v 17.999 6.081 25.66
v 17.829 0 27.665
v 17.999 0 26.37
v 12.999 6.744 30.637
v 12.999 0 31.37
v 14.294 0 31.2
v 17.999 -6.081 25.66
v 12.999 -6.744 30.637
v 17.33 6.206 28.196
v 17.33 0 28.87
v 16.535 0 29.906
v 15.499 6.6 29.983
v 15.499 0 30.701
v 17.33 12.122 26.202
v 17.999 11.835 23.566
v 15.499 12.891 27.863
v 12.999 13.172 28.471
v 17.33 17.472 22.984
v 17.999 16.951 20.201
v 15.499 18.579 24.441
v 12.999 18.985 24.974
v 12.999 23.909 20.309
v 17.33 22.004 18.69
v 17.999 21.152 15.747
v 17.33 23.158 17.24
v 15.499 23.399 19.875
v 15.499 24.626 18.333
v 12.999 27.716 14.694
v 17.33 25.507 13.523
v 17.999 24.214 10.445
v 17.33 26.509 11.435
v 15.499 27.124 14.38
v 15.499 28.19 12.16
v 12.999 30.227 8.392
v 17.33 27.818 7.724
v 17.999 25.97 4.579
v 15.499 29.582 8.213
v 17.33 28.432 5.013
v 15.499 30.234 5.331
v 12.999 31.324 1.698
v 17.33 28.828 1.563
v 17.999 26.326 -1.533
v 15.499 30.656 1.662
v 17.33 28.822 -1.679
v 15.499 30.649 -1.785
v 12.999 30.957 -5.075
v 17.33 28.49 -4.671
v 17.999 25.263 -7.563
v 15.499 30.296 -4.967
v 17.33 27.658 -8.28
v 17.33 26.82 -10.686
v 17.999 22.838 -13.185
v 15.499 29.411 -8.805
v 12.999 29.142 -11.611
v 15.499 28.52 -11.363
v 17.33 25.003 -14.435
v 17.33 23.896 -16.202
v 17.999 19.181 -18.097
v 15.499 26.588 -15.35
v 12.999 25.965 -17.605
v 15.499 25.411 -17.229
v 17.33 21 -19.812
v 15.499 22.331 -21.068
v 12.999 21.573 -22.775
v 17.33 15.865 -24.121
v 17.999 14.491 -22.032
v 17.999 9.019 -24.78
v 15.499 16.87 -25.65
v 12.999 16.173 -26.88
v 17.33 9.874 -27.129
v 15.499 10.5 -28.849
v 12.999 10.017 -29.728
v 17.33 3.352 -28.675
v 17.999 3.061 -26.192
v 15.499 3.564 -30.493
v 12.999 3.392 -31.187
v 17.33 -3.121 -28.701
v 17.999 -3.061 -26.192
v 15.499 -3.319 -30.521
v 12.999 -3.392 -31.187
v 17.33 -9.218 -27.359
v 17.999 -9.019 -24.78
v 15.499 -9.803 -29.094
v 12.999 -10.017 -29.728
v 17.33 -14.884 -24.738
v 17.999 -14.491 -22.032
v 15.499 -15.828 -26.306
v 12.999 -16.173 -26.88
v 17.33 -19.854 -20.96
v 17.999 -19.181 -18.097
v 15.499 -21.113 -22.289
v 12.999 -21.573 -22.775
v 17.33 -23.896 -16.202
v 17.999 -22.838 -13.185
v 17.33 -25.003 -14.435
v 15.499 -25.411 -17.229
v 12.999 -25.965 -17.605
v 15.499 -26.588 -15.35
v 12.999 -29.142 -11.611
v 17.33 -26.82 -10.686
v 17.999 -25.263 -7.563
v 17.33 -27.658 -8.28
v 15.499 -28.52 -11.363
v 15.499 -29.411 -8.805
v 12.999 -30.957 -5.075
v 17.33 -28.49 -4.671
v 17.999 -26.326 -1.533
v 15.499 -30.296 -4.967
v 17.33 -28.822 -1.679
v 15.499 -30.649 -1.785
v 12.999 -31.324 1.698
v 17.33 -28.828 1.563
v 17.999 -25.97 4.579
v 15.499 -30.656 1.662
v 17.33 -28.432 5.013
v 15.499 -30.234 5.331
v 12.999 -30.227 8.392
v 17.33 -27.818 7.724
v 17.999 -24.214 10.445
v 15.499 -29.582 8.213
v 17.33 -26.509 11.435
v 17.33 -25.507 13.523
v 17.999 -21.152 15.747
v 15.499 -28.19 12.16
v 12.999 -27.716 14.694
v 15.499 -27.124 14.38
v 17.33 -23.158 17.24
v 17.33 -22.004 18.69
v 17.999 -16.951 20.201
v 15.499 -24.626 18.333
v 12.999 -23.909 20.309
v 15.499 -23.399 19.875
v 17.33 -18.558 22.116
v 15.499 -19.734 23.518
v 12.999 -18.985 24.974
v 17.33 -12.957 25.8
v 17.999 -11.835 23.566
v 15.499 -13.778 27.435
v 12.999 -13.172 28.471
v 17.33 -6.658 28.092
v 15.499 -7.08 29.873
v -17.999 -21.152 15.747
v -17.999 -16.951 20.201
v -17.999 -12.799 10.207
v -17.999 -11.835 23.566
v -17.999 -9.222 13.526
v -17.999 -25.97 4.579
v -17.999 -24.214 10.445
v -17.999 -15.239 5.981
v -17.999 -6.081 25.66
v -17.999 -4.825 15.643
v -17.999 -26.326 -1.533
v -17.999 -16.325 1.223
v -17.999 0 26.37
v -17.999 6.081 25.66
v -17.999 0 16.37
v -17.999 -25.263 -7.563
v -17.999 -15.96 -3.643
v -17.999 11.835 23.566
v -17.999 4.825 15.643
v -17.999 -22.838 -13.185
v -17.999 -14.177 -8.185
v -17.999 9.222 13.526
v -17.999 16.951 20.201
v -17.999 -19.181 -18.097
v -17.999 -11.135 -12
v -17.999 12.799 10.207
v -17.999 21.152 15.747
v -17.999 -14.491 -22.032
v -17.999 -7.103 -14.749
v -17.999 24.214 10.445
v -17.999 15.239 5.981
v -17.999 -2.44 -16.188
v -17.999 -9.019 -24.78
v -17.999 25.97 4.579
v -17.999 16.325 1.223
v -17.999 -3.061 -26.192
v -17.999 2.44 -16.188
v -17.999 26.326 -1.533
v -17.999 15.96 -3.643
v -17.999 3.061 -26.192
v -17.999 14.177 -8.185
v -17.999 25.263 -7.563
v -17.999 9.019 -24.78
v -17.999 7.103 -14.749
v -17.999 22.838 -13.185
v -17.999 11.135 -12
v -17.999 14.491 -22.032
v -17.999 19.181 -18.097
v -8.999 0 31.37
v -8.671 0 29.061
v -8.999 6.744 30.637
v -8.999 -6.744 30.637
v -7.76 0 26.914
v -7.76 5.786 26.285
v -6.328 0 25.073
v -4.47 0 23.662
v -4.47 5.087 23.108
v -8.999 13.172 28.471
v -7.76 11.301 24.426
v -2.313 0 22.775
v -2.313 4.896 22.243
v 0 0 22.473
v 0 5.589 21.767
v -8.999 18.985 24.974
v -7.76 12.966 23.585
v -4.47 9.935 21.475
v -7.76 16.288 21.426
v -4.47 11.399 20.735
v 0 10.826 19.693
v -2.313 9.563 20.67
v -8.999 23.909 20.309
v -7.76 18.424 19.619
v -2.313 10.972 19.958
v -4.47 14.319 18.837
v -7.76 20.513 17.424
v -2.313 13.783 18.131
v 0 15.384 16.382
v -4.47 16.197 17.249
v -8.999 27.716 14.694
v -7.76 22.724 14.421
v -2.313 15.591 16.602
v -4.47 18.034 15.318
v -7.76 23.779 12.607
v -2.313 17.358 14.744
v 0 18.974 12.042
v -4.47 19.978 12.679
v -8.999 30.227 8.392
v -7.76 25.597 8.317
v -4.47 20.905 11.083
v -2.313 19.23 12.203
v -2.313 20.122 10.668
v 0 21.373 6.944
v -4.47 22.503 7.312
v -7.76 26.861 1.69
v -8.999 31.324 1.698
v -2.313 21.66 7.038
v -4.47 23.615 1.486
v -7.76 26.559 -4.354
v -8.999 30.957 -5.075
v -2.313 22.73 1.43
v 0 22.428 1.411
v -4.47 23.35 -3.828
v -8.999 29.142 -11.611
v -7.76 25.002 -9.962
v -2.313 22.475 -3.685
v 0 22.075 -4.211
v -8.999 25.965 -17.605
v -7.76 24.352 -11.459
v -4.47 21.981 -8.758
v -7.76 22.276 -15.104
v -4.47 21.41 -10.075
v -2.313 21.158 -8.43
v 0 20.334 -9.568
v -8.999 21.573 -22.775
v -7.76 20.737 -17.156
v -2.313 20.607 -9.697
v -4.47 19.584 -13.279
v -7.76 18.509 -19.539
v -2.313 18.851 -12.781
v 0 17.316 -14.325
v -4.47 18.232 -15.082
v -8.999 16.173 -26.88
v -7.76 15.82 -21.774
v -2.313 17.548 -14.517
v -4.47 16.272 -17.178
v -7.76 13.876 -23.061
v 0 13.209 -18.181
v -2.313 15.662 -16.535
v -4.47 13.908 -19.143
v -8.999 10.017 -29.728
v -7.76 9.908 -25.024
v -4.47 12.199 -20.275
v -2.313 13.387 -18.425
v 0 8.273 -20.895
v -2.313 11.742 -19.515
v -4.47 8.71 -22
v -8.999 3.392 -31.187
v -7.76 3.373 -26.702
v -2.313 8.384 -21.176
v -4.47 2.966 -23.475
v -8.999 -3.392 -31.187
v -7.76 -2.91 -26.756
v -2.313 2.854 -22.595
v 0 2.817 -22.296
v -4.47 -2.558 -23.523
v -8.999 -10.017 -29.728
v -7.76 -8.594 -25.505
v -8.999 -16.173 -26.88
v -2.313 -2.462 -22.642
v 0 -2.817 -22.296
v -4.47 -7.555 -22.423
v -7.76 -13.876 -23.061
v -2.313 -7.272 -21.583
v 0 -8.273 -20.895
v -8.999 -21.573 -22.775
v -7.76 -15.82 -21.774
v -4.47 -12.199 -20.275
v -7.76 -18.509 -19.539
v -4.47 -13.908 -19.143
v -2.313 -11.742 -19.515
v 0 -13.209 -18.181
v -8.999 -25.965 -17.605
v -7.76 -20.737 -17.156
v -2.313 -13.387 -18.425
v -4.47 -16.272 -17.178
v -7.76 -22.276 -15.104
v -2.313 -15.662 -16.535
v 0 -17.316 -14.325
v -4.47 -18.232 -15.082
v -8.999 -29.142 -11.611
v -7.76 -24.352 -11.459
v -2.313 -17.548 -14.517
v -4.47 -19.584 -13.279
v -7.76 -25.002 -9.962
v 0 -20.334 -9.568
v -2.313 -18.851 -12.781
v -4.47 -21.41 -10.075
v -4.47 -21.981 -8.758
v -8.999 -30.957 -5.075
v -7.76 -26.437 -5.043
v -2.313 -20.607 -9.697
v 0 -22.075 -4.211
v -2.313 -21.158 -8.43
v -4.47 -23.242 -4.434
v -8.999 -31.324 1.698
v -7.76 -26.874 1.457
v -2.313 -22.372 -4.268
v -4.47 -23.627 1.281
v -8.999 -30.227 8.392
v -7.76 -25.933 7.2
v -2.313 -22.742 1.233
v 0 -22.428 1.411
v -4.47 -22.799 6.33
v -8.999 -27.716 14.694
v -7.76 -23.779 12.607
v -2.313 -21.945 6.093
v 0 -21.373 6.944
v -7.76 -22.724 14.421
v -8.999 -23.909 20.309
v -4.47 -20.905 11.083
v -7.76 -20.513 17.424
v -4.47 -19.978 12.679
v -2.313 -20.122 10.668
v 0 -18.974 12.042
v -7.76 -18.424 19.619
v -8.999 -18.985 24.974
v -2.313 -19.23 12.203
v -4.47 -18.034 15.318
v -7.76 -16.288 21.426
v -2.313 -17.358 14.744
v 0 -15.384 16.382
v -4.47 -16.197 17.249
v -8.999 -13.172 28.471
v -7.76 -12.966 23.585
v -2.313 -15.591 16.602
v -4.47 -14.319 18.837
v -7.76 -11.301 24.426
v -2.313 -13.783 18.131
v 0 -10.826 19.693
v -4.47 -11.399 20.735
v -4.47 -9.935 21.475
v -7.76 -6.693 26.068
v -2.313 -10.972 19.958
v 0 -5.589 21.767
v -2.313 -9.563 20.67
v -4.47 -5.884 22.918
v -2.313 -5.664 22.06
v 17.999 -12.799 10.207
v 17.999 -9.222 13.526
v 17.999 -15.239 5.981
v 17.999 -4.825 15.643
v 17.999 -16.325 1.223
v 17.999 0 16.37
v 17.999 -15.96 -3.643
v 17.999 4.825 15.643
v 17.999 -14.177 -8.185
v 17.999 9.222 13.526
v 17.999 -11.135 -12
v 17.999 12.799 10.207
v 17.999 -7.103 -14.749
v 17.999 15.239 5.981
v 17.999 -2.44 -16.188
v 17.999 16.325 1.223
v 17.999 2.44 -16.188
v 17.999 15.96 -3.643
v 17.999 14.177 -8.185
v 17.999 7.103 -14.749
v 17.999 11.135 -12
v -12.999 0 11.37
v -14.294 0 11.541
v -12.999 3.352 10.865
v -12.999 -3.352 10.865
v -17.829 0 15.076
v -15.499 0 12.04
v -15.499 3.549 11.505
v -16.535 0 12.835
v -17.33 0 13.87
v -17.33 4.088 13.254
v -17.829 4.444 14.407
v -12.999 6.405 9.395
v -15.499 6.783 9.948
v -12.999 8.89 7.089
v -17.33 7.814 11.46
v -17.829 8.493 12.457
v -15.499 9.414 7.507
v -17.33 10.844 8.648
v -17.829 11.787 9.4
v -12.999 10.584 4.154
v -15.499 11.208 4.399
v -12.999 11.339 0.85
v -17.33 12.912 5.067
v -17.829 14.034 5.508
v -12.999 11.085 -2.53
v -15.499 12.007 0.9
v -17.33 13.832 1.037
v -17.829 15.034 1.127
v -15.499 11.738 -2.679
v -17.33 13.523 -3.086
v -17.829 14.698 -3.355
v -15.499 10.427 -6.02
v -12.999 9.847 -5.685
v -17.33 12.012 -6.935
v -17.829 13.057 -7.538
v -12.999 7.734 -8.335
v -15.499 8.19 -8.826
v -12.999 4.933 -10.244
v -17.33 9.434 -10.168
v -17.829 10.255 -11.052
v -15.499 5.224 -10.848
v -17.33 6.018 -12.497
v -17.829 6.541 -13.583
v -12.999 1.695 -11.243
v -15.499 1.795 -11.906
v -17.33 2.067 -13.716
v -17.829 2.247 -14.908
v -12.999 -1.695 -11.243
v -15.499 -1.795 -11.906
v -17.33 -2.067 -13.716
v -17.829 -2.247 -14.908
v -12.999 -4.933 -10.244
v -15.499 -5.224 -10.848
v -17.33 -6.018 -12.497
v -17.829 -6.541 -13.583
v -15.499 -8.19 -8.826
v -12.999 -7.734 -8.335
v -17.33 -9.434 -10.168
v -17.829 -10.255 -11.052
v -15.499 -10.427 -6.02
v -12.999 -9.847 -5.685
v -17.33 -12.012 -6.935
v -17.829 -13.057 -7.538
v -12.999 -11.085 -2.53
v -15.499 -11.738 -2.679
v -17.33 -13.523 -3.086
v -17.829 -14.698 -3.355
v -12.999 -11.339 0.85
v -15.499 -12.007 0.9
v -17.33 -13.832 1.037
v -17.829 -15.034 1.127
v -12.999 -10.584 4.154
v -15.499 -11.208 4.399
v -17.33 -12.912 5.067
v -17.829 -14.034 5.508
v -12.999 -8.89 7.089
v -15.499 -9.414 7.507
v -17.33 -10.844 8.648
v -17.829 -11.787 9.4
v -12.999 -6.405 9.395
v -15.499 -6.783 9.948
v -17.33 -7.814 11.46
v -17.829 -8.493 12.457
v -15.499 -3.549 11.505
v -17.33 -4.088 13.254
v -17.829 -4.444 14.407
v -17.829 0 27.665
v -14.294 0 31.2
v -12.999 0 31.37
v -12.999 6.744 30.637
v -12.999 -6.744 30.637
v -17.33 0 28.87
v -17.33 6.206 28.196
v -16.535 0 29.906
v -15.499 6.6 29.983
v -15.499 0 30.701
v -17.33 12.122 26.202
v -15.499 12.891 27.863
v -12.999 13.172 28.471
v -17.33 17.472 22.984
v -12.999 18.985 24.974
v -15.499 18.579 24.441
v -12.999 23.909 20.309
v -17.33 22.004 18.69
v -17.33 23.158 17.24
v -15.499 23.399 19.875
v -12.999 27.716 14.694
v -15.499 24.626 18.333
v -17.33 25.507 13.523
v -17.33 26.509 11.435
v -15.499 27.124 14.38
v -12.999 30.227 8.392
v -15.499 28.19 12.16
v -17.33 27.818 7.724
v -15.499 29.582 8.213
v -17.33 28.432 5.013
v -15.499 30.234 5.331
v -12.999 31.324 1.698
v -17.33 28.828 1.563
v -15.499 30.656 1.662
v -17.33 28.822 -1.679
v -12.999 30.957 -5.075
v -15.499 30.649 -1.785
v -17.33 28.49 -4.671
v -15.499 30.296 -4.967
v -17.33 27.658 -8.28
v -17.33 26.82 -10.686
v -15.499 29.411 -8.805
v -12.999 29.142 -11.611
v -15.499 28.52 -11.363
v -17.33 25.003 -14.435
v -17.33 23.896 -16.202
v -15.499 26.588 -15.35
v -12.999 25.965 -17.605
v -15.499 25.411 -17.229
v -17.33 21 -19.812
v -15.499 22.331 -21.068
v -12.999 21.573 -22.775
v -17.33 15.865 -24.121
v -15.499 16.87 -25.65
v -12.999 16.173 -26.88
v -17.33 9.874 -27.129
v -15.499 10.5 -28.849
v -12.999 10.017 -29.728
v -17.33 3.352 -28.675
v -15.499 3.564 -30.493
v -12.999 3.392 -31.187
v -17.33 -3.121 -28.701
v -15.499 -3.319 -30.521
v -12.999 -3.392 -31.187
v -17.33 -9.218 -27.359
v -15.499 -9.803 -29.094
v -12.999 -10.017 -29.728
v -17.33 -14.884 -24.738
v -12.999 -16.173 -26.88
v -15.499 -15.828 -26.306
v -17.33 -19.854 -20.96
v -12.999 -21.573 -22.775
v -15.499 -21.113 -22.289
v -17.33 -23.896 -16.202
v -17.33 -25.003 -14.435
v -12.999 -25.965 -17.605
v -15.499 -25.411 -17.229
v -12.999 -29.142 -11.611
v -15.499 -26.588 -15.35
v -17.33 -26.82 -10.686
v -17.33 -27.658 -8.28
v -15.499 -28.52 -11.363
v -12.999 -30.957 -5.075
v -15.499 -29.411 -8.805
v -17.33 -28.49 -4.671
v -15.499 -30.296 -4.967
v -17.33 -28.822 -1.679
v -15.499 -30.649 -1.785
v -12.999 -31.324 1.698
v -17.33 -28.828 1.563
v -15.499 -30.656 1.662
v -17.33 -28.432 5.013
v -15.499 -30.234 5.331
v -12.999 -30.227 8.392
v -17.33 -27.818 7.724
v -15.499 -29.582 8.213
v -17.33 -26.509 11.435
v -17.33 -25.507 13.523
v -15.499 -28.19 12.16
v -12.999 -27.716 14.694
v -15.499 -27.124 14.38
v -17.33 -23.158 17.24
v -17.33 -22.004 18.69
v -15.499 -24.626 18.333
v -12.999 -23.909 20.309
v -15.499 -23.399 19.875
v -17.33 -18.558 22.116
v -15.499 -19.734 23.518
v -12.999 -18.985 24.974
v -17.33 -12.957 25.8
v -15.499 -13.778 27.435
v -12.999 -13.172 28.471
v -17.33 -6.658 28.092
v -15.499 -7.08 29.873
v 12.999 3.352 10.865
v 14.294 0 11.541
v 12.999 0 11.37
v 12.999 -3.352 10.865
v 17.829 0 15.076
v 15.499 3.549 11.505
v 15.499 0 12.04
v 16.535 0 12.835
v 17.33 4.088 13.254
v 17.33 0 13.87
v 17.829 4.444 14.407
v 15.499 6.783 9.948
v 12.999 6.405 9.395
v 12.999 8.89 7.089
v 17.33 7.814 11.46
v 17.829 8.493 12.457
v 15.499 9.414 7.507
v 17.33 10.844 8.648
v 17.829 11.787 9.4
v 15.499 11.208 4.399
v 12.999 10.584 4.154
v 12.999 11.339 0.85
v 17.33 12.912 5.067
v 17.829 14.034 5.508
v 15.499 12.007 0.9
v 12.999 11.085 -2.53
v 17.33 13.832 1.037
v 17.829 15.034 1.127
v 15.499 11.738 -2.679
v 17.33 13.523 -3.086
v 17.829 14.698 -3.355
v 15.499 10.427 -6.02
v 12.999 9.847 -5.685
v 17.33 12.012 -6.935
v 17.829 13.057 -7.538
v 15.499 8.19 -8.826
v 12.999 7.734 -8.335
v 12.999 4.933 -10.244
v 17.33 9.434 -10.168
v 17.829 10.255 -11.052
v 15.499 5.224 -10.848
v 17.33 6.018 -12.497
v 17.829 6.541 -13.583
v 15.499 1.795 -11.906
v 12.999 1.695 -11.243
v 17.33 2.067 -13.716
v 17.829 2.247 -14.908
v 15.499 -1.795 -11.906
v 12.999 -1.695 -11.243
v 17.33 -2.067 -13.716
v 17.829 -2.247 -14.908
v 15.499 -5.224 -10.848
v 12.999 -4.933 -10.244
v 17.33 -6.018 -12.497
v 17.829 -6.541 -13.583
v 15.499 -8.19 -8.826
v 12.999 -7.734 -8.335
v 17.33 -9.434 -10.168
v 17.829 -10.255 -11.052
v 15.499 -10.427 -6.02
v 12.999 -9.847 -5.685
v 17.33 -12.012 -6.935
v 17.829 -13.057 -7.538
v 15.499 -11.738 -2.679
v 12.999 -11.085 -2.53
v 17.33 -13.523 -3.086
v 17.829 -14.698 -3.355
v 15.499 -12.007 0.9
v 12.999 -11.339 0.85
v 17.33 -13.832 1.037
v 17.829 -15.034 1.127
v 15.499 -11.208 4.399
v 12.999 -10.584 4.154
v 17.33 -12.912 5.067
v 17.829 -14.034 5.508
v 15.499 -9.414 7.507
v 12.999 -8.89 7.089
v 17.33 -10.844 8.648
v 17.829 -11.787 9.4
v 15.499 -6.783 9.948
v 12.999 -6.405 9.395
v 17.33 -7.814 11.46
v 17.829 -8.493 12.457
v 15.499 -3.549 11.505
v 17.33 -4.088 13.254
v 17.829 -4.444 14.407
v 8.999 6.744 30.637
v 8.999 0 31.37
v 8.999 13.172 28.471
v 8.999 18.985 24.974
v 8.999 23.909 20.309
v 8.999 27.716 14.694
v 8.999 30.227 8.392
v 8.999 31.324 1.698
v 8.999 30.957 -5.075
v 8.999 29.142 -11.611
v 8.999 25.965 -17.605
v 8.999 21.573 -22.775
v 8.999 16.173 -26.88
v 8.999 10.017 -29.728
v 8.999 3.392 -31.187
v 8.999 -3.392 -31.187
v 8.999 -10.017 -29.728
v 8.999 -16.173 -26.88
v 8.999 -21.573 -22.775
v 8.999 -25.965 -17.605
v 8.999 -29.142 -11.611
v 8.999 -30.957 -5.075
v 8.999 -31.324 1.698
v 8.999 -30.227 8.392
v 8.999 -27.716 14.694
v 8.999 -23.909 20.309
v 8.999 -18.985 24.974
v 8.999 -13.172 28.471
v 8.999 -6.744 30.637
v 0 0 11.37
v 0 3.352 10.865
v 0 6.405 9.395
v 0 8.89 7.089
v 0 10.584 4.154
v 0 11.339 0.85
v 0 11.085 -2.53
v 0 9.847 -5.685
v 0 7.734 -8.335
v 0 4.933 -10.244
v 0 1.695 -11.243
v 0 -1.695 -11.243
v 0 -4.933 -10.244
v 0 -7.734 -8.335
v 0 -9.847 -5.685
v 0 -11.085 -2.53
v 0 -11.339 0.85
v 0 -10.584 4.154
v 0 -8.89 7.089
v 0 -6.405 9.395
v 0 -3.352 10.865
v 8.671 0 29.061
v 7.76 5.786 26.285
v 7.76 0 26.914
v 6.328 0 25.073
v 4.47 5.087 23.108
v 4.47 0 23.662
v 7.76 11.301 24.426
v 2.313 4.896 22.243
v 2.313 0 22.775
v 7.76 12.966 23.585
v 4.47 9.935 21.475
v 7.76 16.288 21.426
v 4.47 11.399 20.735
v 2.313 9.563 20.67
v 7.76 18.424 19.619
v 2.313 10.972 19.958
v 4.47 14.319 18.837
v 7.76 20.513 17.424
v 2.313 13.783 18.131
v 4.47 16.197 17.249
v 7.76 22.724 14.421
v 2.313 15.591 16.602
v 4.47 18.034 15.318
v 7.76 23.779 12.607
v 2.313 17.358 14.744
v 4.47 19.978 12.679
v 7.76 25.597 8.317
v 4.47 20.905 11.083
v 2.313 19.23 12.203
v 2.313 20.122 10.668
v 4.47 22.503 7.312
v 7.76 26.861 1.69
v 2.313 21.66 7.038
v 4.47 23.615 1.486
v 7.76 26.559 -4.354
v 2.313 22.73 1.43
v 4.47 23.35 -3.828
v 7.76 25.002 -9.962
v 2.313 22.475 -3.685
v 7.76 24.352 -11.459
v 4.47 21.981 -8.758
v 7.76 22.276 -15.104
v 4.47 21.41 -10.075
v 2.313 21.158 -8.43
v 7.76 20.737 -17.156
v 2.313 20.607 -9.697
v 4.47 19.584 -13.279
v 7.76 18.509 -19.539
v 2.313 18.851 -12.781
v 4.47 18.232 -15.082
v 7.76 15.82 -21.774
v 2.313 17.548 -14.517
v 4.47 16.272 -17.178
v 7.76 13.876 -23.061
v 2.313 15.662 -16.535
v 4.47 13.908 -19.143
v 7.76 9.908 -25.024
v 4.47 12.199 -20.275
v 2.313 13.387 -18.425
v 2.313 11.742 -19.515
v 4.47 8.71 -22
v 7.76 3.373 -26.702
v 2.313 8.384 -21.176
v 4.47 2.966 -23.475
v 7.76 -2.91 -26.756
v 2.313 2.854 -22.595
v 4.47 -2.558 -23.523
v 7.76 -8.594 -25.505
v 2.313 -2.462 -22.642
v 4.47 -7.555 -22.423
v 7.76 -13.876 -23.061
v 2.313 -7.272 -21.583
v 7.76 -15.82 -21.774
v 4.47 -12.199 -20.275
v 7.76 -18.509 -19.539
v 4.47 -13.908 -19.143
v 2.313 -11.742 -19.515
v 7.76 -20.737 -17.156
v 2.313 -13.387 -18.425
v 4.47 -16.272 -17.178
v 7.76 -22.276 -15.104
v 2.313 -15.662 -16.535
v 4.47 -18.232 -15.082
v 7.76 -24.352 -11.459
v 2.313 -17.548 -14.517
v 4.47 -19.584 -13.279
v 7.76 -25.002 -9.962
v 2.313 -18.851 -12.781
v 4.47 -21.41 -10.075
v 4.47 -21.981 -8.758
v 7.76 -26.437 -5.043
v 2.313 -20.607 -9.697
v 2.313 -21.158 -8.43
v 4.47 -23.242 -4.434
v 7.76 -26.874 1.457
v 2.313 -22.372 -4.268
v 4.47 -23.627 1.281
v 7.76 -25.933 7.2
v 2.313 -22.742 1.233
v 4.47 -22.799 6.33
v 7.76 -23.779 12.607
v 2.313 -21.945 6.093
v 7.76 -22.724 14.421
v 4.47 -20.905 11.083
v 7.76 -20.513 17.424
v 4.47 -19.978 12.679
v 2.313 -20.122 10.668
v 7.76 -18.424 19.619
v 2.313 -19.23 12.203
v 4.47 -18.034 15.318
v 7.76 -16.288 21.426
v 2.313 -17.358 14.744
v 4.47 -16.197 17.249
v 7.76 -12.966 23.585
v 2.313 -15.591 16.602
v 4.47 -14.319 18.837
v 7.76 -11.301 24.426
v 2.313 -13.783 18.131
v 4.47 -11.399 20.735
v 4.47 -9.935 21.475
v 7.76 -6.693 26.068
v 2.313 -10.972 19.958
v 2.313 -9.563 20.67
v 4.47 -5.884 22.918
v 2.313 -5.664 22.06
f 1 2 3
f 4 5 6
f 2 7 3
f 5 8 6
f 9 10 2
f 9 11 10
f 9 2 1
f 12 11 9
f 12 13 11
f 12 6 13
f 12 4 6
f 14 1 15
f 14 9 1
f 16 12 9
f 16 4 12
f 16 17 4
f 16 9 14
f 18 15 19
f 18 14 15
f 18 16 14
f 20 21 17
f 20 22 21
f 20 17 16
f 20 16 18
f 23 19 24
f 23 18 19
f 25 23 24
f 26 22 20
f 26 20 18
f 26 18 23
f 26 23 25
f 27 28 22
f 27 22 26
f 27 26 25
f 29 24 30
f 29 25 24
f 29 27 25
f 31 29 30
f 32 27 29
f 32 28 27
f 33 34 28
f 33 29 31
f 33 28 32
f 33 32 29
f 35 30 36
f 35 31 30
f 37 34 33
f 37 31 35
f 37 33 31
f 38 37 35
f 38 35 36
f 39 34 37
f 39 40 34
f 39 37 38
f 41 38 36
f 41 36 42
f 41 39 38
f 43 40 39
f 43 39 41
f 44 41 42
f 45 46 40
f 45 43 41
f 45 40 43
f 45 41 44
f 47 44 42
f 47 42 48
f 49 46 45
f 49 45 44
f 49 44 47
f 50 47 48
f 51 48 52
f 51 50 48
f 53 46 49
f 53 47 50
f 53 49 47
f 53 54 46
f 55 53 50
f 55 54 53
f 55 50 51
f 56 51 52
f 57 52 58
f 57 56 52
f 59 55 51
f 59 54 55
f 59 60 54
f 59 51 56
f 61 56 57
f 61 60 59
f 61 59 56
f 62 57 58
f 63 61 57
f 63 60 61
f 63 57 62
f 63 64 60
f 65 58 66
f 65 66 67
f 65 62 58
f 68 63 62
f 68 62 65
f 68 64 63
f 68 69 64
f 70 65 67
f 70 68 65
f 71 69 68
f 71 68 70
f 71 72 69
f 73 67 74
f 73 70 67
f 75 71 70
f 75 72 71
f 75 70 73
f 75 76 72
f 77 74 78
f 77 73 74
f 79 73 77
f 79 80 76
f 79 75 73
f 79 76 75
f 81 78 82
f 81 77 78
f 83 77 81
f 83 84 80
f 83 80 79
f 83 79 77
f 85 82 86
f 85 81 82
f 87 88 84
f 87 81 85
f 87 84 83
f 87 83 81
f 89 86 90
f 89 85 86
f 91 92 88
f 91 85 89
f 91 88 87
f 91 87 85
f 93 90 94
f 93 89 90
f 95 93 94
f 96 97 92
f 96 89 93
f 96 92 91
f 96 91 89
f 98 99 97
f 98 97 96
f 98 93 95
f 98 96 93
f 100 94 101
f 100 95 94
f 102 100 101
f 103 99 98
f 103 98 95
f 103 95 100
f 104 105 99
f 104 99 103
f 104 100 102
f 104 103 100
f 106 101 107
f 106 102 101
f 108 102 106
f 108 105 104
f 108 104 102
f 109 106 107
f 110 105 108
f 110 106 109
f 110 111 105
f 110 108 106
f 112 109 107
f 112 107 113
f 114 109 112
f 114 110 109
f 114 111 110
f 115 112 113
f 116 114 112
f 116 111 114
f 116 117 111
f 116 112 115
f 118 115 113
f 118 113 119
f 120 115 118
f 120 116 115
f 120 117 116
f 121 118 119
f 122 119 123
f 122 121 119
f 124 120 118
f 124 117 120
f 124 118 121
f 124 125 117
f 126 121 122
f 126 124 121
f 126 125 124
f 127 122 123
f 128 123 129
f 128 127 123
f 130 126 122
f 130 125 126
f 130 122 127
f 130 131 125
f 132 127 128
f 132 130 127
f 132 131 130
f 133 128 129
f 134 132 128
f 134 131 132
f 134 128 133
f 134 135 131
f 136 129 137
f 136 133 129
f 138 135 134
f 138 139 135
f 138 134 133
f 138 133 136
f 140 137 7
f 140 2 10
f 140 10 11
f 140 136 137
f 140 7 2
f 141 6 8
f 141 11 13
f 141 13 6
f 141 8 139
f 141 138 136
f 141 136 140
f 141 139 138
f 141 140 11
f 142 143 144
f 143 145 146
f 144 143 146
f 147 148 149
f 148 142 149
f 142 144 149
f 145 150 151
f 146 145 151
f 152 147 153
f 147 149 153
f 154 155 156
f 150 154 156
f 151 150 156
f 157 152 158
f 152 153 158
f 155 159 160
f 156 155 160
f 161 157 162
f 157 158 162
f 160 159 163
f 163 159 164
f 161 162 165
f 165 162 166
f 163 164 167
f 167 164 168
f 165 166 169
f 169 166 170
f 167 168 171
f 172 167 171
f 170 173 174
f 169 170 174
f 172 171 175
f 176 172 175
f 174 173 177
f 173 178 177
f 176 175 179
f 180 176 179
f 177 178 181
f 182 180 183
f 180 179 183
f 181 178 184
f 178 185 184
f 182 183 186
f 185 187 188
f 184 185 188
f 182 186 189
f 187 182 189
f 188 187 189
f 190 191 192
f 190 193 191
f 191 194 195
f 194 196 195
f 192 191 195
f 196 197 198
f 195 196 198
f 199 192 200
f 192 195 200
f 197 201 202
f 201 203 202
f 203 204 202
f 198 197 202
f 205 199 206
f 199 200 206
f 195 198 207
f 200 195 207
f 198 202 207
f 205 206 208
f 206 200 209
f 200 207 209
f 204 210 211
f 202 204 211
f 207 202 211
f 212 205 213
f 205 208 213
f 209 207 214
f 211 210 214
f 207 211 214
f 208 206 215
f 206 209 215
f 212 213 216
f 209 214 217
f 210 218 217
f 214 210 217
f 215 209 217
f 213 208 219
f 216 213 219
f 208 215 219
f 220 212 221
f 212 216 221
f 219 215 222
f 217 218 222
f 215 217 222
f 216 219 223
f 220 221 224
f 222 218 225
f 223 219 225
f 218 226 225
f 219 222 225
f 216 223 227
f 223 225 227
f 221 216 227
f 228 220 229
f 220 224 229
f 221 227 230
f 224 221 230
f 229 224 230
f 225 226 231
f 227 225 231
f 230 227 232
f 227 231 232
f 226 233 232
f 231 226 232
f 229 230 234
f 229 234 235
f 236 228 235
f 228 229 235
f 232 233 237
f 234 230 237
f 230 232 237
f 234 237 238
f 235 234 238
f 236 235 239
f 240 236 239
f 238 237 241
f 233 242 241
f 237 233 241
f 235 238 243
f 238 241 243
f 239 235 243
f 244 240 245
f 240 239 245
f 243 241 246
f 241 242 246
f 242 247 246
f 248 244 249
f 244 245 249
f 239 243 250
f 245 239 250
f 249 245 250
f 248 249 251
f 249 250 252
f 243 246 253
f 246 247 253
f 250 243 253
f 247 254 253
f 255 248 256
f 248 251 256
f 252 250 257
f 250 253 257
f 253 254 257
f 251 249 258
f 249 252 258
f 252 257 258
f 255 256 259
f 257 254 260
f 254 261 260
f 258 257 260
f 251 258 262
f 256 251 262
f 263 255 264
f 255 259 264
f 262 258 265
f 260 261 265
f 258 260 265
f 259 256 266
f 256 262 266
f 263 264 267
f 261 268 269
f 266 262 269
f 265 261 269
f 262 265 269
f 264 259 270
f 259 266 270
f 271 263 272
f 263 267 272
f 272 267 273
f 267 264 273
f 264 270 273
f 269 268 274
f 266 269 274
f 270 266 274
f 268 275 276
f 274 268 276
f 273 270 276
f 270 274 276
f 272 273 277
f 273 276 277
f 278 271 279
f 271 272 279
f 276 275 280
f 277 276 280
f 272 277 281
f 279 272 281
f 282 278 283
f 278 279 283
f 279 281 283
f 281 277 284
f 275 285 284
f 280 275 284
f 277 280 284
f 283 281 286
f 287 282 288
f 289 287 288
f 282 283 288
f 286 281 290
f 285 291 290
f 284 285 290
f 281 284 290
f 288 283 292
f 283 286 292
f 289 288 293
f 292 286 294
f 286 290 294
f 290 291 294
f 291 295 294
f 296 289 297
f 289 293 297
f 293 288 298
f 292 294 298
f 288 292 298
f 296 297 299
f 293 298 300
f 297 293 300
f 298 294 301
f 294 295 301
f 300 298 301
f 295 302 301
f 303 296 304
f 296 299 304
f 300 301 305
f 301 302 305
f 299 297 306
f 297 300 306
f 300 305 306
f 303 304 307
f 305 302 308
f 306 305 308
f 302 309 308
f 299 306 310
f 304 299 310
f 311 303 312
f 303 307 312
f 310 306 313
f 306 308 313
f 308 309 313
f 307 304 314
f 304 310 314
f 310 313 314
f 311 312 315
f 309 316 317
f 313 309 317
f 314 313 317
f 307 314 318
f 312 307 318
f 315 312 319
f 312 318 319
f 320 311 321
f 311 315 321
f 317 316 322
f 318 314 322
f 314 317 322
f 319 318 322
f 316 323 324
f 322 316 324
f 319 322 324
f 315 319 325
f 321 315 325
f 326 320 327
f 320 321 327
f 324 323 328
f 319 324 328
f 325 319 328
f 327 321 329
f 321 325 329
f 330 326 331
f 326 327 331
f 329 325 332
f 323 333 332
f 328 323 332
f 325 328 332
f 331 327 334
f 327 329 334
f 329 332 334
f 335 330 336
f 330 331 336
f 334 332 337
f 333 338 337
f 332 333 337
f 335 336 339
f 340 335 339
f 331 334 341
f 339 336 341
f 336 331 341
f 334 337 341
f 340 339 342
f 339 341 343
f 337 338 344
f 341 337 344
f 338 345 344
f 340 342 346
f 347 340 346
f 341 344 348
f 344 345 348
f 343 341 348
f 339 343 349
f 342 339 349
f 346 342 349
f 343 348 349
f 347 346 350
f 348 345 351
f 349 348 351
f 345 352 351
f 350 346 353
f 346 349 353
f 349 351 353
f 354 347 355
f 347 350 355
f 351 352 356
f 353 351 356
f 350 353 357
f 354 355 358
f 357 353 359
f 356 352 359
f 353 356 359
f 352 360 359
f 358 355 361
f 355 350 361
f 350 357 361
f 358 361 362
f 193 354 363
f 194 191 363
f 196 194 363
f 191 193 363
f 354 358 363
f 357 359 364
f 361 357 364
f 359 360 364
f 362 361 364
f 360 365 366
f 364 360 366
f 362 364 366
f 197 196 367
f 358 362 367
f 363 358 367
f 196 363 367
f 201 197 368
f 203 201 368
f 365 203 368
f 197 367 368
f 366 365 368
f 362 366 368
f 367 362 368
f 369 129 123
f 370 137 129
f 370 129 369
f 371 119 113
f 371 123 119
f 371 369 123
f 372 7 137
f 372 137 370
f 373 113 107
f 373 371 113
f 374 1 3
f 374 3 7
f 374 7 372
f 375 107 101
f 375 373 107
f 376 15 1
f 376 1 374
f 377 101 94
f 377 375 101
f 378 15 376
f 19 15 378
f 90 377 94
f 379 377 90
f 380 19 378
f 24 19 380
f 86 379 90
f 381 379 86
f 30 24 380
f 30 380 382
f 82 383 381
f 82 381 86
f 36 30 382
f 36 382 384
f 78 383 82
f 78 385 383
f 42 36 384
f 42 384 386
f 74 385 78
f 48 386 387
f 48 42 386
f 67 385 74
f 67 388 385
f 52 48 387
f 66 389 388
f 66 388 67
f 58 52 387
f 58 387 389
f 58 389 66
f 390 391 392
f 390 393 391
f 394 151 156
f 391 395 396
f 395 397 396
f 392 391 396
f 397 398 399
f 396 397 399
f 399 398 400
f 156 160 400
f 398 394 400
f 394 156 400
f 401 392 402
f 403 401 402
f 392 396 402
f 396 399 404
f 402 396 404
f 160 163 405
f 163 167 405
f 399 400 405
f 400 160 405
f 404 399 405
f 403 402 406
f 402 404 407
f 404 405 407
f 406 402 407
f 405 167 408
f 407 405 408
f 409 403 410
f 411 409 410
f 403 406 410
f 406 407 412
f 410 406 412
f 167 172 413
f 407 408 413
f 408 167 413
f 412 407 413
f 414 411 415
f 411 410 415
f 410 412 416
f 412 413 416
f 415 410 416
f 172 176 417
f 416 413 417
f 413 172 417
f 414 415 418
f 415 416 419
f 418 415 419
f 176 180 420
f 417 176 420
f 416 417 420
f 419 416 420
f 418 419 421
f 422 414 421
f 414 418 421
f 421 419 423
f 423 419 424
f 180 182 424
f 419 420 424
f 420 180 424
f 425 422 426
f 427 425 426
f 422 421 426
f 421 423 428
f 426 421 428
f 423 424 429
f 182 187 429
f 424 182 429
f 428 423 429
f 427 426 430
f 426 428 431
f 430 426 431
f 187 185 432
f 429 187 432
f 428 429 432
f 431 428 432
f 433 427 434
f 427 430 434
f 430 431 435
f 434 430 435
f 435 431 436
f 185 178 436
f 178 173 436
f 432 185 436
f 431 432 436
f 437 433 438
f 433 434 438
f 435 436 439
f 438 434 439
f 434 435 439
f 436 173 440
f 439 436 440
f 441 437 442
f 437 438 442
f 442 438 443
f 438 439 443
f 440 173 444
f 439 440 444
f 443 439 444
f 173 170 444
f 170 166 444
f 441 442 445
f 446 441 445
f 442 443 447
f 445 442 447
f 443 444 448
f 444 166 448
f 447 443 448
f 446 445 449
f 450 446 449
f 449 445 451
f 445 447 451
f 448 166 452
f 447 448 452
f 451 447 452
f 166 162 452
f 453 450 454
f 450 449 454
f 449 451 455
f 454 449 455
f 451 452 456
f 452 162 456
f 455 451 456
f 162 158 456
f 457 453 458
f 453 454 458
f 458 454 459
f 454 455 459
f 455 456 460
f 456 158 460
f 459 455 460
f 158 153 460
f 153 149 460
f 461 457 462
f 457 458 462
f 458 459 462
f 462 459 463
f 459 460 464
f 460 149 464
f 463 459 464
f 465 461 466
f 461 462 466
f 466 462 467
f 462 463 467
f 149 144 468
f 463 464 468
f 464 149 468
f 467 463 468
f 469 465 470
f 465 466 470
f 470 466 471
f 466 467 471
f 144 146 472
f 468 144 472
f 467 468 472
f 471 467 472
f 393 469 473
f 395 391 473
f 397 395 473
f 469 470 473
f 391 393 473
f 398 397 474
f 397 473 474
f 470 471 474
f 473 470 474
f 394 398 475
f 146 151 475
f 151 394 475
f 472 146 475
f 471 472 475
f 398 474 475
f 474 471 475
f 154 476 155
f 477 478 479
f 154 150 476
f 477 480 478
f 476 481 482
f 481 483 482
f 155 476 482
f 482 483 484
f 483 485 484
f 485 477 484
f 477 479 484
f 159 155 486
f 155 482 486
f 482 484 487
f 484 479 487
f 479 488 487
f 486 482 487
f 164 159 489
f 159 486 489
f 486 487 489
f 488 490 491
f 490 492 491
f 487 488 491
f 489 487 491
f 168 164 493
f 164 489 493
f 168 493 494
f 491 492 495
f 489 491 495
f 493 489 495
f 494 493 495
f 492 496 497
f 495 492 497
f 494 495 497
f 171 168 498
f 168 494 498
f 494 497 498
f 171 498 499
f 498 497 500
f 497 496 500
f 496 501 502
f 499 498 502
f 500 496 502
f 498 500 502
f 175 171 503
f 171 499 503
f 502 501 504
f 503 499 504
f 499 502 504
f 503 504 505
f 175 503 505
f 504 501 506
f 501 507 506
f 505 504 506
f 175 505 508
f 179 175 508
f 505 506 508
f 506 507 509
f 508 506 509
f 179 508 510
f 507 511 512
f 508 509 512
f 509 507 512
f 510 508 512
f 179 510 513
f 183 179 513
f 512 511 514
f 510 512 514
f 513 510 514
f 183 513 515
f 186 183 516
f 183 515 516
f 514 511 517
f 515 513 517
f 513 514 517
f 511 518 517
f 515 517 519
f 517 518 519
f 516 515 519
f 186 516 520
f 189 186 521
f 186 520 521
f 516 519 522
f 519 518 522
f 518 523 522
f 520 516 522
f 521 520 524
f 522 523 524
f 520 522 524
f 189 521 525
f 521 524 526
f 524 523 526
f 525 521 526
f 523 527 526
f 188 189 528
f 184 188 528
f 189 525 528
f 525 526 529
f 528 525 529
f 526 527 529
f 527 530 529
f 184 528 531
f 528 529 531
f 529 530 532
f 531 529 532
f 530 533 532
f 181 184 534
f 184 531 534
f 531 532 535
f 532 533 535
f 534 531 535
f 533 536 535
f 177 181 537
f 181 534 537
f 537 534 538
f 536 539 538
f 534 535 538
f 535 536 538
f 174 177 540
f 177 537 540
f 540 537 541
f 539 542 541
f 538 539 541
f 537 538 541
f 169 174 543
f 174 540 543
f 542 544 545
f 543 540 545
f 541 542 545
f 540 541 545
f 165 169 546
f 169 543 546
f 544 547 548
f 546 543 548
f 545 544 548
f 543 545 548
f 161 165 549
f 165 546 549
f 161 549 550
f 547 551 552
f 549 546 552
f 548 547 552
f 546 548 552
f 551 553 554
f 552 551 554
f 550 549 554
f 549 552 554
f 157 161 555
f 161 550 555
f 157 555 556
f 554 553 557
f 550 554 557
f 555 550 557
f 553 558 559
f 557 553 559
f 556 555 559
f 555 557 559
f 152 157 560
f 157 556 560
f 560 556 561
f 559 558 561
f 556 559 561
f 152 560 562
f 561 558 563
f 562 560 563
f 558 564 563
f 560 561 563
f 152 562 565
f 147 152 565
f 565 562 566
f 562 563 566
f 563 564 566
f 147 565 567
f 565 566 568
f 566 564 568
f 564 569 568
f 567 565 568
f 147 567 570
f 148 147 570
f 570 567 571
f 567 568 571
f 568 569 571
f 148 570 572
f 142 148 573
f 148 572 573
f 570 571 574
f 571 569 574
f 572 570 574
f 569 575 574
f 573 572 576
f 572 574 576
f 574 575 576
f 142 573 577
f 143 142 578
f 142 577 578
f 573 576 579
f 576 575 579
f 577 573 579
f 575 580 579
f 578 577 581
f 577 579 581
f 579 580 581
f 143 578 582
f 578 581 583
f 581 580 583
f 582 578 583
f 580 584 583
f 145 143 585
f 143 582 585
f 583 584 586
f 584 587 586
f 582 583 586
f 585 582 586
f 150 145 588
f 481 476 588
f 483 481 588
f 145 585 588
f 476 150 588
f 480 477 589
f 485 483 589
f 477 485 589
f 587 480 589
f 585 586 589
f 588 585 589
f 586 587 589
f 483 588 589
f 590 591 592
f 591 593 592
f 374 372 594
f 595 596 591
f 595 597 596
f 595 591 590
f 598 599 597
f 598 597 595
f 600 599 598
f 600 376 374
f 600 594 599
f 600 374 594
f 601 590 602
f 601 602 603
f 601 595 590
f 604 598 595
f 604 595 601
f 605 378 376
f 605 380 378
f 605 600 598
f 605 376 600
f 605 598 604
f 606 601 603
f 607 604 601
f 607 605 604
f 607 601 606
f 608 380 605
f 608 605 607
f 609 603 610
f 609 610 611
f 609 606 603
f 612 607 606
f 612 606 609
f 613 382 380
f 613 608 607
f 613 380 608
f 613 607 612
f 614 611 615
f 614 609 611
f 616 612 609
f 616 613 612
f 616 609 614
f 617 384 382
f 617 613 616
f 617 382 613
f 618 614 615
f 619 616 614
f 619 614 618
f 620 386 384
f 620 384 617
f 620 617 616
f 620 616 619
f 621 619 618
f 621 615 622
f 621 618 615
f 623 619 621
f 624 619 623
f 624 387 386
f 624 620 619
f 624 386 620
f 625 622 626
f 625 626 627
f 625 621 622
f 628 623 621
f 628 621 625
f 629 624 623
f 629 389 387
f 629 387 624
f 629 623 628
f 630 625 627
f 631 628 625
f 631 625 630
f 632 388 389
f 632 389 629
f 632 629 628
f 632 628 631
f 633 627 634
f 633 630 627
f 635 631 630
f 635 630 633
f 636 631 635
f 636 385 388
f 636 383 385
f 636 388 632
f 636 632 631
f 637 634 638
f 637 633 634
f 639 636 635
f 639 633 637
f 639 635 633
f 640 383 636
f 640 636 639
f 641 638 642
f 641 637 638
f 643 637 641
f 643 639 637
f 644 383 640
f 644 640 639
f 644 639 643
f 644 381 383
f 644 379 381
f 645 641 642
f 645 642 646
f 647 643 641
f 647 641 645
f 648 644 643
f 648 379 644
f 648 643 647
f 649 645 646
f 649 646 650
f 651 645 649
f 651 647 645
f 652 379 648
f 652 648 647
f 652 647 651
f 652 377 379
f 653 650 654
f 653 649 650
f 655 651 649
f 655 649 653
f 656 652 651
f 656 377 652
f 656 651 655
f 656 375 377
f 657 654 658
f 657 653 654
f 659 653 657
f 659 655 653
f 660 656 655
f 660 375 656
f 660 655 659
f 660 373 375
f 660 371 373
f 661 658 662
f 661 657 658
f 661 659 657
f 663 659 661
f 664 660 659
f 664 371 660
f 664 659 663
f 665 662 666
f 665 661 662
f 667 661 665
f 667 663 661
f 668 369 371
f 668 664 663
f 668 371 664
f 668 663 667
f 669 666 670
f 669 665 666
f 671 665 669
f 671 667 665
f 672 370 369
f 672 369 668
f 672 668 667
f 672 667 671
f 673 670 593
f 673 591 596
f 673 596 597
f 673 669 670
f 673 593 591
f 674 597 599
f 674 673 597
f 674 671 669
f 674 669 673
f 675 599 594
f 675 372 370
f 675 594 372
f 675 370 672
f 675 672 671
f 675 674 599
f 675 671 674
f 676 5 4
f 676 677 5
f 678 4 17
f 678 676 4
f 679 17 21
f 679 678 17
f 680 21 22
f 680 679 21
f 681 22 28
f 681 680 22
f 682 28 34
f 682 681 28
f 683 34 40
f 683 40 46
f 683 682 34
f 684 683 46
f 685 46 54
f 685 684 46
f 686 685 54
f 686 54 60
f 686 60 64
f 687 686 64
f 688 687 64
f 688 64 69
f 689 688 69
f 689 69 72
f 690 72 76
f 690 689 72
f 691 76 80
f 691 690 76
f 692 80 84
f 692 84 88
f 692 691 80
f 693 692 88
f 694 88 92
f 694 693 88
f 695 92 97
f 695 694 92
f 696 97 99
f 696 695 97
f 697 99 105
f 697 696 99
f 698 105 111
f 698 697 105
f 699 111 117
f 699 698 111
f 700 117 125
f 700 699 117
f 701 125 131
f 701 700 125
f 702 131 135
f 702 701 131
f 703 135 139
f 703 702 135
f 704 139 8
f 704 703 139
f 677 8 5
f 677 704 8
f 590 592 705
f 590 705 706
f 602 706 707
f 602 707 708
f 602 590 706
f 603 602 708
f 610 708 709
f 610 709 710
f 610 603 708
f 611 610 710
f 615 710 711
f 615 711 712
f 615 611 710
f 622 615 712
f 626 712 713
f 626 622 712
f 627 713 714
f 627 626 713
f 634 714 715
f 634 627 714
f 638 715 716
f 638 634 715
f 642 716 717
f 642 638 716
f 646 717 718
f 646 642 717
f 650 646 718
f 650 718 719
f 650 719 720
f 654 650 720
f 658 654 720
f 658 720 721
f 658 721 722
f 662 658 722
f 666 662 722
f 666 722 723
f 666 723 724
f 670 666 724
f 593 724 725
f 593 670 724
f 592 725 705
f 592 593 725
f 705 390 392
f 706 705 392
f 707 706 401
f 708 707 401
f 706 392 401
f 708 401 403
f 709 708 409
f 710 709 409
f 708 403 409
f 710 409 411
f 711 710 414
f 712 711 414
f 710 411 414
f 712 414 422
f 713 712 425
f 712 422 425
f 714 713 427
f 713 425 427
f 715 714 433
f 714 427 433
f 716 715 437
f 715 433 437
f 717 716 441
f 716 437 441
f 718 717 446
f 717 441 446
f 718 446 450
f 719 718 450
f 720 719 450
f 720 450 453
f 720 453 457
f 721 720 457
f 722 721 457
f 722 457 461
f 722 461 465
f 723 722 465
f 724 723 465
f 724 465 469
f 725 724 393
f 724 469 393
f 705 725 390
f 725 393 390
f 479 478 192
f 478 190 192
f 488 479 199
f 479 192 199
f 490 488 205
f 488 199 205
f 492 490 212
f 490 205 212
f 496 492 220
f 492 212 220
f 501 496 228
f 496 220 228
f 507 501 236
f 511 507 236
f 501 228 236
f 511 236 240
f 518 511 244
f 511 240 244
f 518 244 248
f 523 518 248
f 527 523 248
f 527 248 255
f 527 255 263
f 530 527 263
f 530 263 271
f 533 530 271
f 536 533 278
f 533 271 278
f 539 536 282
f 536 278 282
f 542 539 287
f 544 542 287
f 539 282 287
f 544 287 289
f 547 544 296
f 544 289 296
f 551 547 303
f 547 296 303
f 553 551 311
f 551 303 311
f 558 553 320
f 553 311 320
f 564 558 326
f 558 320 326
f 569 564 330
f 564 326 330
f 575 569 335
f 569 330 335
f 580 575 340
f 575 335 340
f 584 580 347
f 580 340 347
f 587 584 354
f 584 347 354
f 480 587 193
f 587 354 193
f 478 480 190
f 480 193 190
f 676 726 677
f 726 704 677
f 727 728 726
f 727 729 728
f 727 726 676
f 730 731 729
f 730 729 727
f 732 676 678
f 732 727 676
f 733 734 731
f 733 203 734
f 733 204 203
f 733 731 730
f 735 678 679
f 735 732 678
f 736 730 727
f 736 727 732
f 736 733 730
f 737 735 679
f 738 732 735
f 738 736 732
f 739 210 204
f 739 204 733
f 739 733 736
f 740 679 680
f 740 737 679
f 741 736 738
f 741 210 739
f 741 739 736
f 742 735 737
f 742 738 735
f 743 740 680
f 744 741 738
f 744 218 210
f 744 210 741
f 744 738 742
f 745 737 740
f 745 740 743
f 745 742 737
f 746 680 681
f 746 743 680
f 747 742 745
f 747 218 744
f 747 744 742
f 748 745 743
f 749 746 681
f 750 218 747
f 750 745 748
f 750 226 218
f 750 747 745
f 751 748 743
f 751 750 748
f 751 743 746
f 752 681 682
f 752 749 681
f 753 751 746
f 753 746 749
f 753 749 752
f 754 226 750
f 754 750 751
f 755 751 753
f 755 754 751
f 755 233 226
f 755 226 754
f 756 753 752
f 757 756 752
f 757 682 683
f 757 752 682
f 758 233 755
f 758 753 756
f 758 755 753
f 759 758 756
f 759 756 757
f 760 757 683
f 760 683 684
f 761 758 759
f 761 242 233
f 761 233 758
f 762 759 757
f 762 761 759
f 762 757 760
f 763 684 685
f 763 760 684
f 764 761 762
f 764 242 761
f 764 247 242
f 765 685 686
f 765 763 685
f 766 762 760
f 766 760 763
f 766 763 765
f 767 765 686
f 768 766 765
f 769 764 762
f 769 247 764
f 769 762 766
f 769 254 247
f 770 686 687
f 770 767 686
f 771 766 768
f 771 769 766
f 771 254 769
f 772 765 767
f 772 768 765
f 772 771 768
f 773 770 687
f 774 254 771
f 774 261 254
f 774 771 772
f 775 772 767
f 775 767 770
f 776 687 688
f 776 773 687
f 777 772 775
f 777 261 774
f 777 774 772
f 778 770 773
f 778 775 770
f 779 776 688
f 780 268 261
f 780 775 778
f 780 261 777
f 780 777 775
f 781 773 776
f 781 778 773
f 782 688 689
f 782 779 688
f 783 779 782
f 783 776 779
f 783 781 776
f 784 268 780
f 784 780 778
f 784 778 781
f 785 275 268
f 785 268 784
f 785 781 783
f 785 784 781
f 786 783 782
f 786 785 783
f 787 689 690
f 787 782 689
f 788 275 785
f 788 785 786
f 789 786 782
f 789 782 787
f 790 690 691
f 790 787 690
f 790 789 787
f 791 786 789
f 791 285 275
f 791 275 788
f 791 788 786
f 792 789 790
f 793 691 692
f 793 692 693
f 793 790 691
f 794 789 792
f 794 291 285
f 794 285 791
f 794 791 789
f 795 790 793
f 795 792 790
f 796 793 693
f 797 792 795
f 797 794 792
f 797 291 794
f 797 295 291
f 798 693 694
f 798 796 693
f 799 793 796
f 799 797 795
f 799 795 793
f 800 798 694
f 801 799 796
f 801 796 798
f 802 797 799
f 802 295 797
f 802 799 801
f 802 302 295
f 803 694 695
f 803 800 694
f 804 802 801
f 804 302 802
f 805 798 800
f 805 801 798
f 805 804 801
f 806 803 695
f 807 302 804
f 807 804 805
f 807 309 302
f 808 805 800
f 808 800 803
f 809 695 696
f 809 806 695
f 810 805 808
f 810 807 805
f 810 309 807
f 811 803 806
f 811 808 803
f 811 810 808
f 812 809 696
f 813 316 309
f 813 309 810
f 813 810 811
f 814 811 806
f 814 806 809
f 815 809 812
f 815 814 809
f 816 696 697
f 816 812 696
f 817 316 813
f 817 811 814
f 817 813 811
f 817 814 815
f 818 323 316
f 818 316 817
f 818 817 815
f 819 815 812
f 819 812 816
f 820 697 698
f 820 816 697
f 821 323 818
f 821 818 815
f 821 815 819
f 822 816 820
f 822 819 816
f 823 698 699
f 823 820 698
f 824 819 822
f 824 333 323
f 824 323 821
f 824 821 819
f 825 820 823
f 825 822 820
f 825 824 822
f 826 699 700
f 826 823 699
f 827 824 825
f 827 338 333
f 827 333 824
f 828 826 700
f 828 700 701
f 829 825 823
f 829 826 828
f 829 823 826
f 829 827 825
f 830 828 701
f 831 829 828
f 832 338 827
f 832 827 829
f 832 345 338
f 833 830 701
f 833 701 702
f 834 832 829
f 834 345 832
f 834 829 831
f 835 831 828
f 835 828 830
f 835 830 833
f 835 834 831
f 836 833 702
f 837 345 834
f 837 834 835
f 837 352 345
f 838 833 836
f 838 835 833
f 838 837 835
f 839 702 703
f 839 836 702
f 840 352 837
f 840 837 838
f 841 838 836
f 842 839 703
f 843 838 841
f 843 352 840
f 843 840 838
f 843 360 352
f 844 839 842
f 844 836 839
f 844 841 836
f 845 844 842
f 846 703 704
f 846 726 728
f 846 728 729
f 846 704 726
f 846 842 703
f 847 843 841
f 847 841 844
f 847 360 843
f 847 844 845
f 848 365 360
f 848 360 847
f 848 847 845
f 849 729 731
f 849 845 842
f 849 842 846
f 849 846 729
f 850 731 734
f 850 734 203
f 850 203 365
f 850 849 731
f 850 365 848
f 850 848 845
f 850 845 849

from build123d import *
from build123d import SkipClean  # not in build123d's __all__


# Not quite as in the source:
# - a feature of the source that left no trace in its solid (it failed there, or was rolled back) is left out
# - the program builds the solid bodies; features that only make, move or delete a surface that nothing else refers to are left out


with BuildPart() as f3:
    # F2 (on Front) → F3 (revolve)
    with BuildSketch(Plane.XZ):
        with BuildLine():
            ThreePointArc((8.9994186326, 31.3704956104), (6.3276909161, 25.0727650489), (0, 22.4727906481))
            Line((0, 22.4727906481), (0, 11.3704956104))
            Line((0, 11.3704956104), (12.9994186326, 11.3704956104))
            ThreePointArc((12.9994186326, 11.3704956104), (16.5349525386, 12.8349617044), (17.9994186326, 16.3704956104))
            Line((17.9994186326, 16.3704956104), (17.9994186326, 26.3704956104))
            ThreePointArc((17.9994186326, 26.3704956104), (16.5349525386, 29.9060295163), (12.9994186326, 31.3704956104))
            Line((12.9994186326, 31.3704956104), (8.9994186326, 31.3704956104))
        make_face()
    revolve(axis=Axis((1.0410054399, 0, 0), (-1, 0, 0)))

    # F0: F3 across plane


with BuildPart() as f3_1:
    add(f3.part, clean=False)
    with SkipClean():  # cleaning this boolean's faces spoils the solid; the shape is the same uncleaned
        add(f3.part.mirror(Plane.YZ), clean=False)


solid = f3_1.part
